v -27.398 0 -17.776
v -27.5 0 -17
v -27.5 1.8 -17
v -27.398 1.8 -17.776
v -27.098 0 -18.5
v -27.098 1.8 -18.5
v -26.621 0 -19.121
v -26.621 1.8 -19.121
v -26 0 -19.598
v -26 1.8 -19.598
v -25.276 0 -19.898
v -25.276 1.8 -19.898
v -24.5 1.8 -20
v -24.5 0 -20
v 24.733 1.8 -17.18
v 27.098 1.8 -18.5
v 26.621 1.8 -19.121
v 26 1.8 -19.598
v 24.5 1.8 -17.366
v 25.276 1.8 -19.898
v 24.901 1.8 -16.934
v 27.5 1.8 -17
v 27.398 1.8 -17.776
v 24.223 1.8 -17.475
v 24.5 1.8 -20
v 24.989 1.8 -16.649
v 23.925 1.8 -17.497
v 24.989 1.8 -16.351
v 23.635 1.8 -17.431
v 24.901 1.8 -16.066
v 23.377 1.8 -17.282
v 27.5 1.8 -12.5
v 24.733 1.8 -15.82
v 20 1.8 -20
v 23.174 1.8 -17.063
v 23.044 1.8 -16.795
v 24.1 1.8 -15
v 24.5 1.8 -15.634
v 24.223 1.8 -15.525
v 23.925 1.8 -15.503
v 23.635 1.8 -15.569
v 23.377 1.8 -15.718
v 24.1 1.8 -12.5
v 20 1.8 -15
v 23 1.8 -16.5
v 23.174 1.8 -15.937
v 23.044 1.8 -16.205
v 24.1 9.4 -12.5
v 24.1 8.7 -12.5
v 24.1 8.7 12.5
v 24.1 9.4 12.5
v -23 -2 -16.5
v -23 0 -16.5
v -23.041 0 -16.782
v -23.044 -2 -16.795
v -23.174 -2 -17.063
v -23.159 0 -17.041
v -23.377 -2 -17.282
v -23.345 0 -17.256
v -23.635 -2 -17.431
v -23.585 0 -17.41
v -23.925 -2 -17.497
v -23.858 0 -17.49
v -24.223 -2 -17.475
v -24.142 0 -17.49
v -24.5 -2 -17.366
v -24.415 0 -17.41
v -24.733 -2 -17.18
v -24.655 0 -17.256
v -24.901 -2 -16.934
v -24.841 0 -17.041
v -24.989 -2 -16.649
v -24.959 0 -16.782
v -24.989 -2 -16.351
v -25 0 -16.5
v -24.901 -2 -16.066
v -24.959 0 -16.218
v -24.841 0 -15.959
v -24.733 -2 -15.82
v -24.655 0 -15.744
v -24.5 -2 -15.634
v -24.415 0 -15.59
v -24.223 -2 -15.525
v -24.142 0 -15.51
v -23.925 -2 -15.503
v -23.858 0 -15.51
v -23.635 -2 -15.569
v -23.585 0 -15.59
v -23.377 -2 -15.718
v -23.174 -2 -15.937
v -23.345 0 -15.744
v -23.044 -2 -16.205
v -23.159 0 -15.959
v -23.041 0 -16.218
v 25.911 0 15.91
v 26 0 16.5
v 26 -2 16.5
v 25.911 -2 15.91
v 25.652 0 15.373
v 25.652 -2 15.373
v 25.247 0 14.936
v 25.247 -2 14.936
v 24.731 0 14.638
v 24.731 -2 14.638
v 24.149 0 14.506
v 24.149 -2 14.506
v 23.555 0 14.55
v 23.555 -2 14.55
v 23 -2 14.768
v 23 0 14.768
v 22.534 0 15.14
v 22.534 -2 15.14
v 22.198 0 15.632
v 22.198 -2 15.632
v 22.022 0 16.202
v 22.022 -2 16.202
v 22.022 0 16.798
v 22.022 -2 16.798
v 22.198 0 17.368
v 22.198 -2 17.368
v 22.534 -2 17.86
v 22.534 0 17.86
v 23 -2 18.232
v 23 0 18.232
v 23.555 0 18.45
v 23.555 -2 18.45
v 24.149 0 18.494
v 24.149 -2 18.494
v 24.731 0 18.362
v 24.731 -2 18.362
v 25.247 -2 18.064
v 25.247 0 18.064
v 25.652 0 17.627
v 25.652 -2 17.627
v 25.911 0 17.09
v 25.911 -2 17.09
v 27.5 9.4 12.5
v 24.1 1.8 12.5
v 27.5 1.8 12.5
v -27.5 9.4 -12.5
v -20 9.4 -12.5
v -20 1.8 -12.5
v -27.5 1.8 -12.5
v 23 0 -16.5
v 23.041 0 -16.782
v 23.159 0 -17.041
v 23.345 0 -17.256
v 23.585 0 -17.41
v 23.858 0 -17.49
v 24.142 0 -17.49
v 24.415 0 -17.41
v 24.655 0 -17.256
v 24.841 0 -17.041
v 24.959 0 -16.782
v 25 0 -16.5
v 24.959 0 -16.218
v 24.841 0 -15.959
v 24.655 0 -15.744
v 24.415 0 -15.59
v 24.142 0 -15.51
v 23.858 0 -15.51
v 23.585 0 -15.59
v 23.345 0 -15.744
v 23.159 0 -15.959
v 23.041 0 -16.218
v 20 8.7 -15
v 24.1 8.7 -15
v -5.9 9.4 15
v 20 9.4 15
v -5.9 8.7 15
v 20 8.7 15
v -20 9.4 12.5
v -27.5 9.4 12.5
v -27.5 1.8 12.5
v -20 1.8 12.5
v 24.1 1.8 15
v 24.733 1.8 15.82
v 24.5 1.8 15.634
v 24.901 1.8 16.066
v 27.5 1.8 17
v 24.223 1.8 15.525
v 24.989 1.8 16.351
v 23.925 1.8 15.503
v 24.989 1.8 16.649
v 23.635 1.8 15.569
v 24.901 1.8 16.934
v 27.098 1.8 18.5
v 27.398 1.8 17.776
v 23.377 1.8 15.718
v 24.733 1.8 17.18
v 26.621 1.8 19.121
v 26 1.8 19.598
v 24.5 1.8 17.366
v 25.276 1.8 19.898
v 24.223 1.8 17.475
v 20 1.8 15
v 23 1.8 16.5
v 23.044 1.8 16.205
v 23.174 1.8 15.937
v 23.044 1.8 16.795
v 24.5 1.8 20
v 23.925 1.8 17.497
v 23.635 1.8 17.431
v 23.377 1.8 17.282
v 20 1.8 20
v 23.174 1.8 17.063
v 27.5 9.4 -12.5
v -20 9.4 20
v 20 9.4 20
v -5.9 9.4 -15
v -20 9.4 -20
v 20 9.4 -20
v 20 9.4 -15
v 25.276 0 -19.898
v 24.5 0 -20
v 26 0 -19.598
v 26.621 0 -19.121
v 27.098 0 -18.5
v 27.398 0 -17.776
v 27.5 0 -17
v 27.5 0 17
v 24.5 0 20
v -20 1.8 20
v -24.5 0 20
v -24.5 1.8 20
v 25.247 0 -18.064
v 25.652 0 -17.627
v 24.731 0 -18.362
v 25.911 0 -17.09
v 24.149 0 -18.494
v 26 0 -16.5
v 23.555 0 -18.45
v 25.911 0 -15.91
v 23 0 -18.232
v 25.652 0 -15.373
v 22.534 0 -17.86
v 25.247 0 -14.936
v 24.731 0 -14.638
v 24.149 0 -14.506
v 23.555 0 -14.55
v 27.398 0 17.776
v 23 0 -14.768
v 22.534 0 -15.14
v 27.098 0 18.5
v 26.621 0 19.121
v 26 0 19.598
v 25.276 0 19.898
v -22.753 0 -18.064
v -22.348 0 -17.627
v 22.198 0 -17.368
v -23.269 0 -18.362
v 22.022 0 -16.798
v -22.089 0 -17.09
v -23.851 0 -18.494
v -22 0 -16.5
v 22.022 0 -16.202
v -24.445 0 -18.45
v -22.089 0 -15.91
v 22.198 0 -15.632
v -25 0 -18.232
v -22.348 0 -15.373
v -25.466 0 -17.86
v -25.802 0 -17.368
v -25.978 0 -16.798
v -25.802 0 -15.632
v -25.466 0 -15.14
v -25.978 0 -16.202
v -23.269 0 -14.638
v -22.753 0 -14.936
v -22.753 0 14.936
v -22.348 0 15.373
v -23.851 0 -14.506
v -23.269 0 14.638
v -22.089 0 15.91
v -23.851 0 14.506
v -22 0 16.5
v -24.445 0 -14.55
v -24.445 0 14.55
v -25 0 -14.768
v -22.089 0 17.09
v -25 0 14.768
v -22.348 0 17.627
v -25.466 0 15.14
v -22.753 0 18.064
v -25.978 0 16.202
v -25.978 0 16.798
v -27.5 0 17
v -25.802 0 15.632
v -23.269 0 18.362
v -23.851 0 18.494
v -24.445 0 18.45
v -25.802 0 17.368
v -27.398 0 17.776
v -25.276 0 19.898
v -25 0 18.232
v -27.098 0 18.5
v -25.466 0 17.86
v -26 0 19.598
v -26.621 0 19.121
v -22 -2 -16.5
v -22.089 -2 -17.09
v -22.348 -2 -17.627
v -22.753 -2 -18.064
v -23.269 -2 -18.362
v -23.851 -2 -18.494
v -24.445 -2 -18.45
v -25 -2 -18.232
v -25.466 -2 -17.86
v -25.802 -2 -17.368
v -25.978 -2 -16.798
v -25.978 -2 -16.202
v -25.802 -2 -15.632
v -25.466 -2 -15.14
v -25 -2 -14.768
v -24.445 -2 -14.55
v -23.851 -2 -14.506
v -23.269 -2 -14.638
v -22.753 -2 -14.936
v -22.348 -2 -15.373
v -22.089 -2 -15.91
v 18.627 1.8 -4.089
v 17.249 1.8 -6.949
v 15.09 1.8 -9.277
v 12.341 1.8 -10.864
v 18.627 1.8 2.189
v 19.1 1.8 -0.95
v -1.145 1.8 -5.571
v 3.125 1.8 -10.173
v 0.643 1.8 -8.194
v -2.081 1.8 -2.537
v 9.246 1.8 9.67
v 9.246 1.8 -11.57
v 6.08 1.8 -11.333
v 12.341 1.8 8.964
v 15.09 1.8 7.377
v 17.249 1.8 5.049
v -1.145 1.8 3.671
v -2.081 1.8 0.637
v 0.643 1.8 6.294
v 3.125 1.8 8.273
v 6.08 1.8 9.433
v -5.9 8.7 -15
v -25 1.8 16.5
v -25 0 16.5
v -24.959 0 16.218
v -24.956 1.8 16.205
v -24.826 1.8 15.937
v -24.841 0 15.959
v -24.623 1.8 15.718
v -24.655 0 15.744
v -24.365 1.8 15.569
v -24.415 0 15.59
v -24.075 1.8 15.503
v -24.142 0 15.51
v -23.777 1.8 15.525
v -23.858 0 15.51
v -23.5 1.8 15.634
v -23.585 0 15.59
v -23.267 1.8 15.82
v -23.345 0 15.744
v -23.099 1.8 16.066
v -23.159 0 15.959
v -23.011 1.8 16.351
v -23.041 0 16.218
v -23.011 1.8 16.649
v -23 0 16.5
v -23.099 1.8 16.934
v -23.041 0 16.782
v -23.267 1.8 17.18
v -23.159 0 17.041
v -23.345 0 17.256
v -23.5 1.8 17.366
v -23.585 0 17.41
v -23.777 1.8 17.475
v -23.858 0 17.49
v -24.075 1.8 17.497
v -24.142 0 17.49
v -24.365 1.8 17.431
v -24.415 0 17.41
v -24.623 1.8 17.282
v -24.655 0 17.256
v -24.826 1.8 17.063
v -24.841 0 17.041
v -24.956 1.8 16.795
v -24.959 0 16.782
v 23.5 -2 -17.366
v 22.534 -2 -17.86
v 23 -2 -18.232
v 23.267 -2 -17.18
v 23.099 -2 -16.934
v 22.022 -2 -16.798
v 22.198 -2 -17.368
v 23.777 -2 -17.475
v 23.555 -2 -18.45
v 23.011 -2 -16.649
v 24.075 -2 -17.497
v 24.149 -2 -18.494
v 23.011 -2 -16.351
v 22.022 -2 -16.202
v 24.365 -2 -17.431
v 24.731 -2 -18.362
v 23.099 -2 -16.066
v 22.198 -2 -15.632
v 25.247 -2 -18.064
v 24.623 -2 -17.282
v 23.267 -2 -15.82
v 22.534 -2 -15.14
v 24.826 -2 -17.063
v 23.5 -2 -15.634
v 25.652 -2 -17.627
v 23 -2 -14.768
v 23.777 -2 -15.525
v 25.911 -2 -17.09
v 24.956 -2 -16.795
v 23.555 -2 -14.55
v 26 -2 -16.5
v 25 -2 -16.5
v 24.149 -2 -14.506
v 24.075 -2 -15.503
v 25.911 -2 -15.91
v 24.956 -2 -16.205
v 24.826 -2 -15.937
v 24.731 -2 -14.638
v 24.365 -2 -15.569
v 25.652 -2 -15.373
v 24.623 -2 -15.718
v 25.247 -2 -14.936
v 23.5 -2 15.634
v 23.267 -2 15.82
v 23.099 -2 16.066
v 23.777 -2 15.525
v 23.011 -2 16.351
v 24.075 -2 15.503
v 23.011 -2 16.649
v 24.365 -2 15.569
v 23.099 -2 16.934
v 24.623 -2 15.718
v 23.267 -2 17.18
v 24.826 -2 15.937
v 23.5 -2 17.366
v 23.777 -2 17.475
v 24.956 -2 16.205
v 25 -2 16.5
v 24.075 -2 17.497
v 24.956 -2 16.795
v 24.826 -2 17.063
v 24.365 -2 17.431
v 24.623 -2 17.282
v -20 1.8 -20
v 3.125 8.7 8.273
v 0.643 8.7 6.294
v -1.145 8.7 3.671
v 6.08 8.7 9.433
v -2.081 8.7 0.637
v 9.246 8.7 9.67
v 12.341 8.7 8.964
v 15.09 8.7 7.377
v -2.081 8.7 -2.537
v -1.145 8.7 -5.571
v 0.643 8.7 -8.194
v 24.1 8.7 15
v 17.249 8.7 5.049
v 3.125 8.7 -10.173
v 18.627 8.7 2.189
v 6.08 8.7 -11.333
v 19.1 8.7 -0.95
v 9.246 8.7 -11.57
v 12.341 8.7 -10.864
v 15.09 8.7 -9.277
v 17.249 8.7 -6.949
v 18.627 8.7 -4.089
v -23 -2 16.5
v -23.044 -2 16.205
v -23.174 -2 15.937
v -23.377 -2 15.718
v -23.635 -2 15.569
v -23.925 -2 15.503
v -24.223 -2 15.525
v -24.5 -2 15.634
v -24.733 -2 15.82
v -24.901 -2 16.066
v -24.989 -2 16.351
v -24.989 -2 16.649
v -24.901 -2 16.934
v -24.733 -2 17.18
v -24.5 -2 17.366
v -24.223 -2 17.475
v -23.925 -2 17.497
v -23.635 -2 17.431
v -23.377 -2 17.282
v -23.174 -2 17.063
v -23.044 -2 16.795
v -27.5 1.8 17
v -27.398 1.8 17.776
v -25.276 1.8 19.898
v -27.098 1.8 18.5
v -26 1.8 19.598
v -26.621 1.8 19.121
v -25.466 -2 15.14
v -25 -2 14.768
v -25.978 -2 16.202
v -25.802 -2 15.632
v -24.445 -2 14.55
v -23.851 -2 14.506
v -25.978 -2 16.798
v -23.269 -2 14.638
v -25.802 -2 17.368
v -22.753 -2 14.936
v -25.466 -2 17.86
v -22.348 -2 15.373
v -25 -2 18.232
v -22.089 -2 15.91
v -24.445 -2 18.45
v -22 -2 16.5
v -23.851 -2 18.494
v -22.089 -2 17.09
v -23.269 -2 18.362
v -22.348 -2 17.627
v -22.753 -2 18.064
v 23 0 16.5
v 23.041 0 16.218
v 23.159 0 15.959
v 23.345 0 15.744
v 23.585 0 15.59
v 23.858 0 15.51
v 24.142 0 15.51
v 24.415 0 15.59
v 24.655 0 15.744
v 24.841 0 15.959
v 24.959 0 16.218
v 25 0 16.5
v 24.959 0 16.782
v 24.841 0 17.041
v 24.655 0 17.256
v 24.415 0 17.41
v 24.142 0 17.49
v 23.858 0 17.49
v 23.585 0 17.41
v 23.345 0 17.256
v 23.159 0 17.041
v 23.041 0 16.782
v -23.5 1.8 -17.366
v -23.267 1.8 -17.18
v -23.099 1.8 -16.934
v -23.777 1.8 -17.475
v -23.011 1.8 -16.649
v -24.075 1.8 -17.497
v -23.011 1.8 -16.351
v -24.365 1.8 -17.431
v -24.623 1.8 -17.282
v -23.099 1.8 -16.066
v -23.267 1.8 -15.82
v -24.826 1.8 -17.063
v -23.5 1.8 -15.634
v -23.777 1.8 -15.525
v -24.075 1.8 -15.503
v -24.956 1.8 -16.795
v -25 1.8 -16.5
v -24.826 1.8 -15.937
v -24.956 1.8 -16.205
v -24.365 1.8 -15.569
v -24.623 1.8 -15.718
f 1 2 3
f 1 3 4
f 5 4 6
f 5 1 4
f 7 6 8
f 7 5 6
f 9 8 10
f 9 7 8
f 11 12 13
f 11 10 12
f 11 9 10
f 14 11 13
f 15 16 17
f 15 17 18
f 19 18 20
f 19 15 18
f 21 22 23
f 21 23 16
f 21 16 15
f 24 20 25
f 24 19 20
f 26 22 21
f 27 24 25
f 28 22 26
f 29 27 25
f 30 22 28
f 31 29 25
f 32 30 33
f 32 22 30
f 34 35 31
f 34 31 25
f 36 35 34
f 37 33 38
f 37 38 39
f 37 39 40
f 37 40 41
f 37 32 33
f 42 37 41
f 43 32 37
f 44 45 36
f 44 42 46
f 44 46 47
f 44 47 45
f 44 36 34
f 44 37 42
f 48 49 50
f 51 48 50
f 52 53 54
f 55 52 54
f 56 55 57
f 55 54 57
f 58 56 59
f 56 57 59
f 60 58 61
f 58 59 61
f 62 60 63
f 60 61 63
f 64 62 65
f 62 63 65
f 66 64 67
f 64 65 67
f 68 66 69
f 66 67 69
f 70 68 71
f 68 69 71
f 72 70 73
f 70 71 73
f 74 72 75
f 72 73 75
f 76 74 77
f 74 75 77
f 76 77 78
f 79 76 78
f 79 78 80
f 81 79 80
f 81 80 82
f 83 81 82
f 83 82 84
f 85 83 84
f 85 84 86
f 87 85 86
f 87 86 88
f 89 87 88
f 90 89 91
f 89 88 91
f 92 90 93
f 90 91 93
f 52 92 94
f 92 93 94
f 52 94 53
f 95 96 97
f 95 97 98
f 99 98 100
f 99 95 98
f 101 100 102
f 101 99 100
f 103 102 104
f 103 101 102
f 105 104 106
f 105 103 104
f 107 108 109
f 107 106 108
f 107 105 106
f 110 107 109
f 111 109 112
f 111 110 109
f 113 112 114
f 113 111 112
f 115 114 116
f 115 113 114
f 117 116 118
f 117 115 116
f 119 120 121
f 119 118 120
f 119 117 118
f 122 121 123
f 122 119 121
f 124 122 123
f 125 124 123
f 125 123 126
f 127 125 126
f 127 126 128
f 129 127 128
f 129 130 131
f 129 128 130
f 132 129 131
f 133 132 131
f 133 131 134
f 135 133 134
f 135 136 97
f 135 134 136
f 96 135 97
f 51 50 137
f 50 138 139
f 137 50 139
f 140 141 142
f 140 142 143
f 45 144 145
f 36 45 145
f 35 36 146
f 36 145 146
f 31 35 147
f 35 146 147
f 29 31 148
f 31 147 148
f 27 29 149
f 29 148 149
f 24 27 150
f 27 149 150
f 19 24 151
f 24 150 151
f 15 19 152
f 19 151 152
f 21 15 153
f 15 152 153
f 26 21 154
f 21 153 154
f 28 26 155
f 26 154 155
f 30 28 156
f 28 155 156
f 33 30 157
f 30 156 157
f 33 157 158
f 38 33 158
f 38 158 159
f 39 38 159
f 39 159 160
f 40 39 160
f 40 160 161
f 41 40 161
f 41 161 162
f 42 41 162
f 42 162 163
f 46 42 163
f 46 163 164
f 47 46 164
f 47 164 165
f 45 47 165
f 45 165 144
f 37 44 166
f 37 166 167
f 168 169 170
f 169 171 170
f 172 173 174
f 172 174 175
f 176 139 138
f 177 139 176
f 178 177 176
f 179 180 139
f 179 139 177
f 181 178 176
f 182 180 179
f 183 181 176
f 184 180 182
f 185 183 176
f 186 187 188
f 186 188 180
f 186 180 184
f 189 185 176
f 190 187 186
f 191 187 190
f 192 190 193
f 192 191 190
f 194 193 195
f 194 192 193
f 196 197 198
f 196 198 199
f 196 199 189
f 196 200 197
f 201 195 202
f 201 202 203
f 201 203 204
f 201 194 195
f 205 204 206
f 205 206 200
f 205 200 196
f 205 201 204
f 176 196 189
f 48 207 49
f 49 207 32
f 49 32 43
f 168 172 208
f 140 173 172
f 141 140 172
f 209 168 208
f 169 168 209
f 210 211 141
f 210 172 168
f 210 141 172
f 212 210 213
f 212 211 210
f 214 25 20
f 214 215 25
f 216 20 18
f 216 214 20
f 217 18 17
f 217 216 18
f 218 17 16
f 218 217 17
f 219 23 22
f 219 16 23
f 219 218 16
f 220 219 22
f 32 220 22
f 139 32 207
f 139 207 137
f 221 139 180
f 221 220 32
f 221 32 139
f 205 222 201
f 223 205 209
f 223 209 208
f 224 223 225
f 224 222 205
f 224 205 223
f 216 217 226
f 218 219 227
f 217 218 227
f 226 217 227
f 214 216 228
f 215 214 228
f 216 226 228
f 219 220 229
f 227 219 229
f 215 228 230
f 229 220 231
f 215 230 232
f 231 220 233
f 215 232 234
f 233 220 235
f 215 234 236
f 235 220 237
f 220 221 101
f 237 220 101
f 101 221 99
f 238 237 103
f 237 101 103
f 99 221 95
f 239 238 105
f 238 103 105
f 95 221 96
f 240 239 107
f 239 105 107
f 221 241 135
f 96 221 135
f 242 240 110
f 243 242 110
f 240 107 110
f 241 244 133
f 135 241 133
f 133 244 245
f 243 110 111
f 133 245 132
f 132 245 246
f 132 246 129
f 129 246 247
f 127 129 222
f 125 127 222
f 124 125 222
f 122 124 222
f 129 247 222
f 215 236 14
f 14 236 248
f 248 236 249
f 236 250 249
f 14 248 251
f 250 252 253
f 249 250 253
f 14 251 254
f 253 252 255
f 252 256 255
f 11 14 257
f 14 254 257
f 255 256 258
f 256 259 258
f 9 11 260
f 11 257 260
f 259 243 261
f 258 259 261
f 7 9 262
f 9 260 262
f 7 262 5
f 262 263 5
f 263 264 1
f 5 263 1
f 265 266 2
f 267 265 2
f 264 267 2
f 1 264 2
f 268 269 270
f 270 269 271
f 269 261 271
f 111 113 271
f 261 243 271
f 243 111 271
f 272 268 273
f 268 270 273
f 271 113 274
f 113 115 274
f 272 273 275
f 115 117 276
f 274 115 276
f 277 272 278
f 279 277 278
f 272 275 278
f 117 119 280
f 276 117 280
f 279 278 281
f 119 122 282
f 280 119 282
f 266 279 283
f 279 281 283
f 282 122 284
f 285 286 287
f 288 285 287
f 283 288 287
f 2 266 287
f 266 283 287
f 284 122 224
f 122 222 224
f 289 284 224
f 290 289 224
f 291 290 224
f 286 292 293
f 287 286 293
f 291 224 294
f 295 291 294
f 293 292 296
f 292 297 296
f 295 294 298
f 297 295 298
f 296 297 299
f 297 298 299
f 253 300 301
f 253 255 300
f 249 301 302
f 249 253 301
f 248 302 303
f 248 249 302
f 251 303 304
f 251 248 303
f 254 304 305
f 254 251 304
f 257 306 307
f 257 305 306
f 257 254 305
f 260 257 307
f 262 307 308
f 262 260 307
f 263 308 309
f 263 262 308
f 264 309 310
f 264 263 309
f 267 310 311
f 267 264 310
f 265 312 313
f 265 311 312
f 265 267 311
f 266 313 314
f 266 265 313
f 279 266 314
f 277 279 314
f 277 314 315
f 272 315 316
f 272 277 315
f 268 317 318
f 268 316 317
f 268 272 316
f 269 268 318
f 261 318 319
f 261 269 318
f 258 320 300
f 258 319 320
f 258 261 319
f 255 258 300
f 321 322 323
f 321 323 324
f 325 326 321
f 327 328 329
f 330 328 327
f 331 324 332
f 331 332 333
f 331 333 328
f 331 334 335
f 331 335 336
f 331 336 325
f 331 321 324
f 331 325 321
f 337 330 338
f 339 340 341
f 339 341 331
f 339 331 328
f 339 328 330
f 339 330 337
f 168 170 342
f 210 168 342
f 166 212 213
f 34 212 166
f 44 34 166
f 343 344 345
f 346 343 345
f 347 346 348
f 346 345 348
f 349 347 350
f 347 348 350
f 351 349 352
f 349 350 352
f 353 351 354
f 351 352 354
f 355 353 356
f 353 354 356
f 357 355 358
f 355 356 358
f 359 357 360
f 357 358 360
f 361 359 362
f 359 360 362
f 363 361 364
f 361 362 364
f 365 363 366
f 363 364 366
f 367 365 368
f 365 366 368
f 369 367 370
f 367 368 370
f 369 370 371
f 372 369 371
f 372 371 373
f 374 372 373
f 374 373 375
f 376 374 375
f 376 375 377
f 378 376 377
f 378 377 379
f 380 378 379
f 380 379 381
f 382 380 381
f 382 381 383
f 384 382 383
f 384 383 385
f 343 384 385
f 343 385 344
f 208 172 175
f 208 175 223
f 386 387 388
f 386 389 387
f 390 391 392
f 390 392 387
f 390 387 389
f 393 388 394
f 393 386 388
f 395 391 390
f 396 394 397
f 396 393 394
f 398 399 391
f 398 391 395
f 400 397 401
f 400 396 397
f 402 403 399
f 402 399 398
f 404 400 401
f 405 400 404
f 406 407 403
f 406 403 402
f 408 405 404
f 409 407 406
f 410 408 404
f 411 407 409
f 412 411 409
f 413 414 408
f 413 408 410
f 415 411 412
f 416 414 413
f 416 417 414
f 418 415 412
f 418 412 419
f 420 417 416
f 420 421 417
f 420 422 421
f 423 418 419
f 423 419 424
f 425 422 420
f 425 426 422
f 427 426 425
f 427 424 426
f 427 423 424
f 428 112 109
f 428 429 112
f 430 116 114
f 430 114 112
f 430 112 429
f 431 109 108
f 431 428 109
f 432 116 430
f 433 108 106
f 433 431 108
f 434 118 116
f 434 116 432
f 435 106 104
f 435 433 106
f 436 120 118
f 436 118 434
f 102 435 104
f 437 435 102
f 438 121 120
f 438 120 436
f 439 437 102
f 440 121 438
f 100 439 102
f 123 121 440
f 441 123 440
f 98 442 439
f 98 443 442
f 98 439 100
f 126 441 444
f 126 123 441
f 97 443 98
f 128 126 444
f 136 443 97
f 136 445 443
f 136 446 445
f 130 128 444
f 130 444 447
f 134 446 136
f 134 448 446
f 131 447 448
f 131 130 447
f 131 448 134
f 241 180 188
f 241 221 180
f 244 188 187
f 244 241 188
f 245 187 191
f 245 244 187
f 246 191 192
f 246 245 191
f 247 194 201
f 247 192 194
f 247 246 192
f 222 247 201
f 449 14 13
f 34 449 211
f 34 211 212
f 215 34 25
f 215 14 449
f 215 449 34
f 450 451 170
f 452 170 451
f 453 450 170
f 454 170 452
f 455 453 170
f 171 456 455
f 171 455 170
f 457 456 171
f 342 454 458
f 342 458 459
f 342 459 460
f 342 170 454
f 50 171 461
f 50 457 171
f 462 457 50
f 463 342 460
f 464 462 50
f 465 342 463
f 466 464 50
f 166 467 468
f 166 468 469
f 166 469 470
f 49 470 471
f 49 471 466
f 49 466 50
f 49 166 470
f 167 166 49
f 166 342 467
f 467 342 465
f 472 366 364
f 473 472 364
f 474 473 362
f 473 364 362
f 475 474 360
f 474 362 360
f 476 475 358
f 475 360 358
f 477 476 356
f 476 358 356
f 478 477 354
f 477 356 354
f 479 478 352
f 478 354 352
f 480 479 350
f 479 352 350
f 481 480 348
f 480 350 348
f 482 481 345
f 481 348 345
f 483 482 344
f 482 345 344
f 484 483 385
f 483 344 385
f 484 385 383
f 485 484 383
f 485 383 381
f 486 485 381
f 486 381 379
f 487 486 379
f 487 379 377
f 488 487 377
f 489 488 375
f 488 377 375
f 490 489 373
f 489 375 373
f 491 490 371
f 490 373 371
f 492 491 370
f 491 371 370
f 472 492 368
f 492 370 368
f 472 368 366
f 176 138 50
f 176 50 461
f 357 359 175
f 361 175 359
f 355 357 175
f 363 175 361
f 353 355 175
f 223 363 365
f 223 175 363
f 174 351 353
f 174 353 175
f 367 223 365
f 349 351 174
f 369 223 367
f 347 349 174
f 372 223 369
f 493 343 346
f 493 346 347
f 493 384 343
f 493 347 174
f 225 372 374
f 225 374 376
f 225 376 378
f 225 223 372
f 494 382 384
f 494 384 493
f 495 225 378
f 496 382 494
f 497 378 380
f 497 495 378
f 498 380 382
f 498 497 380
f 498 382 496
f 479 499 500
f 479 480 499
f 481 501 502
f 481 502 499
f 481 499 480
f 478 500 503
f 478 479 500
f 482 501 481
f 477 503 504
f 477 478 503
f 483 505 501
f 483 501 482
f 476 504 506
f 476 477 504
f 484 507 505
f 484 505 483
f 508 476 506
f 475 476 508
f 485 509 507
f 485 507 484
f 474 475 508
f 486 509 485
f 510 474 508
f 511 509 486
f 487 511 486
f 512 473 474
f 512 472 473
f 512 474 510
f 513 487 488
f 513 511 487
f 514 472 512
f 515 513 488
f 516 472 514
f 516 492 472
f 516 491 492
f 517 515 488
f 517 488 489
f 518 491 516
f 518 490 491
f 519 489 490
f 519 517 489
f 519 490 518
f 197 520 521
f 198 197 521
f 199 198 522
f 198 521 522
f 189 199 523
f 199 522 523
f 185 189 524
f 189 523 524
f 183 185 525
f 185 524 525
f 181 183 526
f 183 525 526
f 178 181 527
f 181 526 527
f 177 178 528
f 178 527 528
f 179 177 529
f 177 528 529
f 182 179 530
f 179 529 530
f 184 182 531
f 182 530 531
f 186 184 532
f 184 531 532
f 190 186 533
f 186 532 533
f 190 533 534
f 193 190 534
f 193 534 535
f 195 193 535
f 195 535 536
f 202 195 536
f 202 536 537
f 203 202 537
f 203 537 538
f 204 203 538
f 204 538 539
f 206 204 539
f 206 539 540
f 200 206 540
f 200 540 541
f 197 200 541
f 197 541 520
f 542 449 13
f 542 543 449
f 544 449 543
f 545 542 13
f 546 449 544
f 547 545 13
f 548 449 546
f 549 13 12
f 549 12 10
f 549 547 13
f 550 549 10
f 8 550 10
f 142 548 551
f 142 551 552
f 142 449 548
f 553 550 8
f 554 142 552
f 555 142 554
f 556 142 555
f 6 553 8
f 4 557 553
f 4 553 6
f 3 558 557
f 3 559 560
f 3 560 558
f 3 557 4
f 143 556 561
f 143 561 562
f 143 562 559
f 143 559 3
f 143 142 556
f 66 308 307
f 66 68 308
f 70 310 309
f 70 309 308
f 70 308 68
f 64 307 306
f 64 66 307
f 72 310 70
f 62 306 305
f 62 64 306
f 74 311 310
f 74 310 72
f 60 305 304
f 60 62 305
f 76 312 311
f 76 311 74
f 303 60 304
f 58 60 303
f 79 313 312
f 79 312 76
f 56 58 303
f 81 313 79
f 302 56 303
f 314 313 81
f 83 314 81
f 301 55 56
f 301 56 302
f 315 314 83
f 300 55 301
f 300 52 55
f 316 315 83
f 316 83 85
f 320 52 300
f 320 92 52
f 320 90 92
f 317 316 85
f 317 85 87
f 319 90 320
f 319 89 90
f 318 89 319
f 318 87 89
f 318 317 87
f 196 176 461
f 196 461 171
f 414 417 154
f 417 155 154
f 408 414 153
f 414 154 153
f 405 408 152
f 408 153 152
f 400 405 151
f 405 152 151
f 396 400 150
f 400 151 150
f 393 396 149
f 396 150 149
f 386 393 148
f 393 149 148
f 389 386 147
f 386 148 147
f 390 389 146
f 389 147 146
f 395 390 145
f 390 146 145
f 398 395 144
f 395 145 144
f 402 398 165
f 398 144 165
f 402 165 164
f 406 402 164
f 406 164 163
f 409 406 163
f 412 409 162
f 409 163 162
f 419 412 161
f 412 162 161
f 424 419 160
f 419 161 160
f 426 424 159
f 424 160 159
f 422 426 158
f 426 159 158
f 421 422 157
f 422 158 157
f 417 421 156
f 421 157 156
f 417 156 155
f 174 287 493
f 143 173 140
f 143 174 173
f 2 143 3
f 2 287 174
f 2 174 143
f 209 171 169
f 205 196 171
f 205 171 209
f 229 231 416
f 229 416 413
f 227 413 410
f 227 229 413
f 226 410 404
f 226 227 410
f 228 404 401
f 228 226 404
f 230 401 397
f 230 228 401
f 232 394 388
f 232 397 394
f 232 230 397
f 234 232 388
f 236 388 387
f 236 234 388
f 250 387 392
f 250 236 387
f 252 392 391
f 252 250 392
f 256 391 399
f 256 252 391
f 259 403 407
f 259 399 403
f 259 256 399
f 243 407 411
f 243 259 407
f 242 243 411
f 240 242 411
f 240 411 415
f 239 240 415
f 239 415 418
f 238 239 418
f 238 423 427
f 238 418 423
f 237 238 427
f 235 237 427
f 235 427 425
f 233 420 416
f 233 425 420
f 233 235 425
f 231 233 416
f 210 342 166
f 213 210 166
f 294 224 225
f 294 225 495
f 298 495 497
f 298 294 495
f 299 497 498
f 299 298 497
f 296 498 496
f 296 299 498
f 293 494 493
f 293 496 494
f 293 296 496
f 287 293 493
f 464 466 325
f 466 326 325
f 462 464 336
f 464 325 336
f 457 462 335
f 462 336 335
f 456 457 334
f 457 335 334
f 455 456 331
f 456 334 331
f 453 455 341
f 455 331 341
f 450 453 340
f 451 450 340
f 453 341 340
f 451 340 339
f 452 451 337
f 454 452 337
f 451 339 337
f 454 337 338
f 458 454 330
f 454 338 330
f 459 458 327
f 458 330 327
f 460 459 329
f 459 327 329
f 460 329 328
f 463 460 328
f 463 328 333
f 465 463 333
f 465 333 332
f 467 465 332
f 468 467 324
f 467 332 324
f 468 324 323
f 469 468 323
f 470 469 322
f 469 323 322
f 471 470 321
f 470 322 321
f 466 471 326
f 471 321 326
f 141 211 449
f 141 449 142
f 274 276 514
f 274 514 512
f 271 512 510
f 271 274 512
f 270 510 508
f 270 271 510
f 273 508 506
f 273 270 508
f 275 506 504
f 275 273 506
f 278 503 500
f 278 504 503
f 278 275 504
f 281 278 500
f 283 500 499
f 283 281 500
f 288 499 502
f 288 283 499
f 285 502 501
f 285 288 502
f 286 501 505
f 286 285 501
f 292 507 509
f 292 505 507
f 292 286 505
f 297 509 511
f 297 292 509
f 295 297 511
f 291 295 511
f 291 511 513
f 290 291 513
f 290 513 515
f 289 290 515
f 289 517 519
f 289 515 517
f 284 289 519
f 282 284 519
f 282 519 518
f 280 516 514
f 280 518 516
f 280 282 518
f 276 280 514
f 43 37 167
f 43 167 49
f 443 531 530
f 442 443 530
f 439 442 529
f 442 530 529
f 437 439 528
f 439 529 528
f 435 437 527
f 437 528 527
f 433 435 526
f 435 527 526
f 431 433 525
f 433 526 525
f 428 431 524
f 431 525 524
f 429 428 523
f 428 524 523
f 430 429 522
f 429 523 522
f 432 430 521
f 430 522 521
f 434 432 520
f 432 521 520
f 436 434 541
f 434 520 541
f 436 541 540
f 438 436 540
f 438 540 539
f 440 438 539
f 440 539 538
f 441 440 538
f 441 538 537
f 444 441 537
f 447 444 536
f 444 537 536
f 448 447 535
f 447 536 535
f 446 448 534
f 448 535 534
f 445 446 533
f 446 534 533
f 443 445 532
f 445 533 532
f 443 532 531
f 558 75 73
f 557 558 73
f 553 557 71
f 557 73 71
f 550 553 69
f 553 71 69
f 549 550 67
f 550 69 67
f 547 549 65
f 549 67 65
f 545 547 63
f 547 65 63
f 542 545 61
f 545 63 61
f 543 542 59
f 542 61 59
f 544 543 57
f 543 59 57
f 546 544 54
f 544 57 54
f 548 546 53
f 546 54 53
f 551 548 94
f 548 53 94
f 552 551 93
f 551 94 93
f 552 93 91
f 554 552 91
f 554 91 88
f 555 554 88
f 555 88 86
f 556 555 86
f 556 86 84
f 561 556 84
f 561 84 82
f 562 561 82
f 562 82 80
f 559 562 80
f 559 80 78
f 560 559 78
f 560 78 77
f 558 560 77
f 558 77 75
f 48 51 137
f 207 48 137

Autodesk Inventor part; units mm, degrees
ref_plane "YZ Plane" through (0, 0, 0) normal (1, 0, 0) x (0, 1, 0)
ref_plane "XZ Plane" through (0, 0, 0) normal (0, 1, 0) x (-1, 0, 0)
ref_plane "XY Plane" through (0, 0, 0) normal (0, 0, 1) x (1, 0, 0)
sketch "Эскиз1" plane through (0, 0, 0) normal (0, 1, 0) x (-1, 0, 0)
  line L0 (-24.5, 20) -> (24.5, 20)
  line L1 (27.5, 17) -> (27.5, -17)
  line L2 (24.5, -20) -> (-24.5, -20)
  line L3 (-27.5, -17) -> (-27.5, 17)
  line L4 (-27.5, 20) -> (27.5, -20) construction
  line L5 (27.5, 20) -> (-27.5, -20) construction
  arc A0 (24.5, -20) -> (27.5, -17) centre (24.5, -17) ccw
  arc A1 (-27.5, -17) -> (-24.5, -20) centre (-24.5, -17) ccw
  arc A2 (-24.5, 20) -> (-27.5, 17) centre (-24.5, 17) ccw
  arc A3 (27.5, 17) -> (24.5, 20) centre (24.5, 17) ccw
  line L6 (-24, 16.5) -> (24, 16.5)
  line L7 (24, 16.5) -> (24, -16.5)
  line L8 (24, -16.5) -> (-24, -16.5)
  line L9 (-24, -16.5) -> (-24, 16.5)
  line L10 (-24, 16.5) -> (24, -16.5) construction
  line L11 (24, 16.5) -> (-24, -16.5) construction
  circle A4 centre (24, 16.5) radius 1
  circle A5 centre (24, -16.5) radius 1
  circle A6 centre (-24, -16.5) radius 1
  circle A7 centre (-24, 16.5) radius 1
  point P0 (0, 0)
  dimension "d0" = 55
  dimension "d1" = 40
  dimension "d2" = 3
  dimension "d3" = 3
  dimension "d30" = 48
  dimension "d31" = 33
  dimension "d32" = 2
  dimension "d33" = 2
  dimension "d34" = 2
  dimension "d35" = 2
extrude "Выдавливание1" add sketch "Эскиз1" along normal blind 1.8 contours L0 A3 L1 A0 L2 A1 L3 A2 | L6 A4 L7 A5 L8 A6 L9 A7
sketch "Эскиз2" plane through (0, 1.8, 0) normal (0, 1, 0) x (1, 0, 0)
  line L0 (-5.9, 15) -> (24.1, 15)
  line L1 (24.1, 15) -> (24.1, -15)
  line L2 (24.1, -15) -> (-5.9, -15)
  line L3 (-5.9, -15) -> (-5.9, 15)
  line L4 (-5.9, 15) -> (24.1, -15) construction
  line L5 (24.1, 15) -> (-5.9, -15) construction
  line L6 (27.5, -17) -> (27.5, 17) projected
  line L7 (-27.5, 17) -> (-27.5, -17) projected
  line L8 (-27.5, 0) -> (27.5, 0)
  circle A0 centre (8.45, 0.95) radius 10.65
  line L9 (8.45, 15) -> (8.45, 0.95)
  line L10 (8.45, 11.6) -> (8.45, 15)
  line L11 (-5.9, 0.95) -> (8.45, 0.95)
  line L12 (-5.9, 0.95) -> (-2.2, 0.95)
  point P0 (0, 0)
  point P1 (9.1, 0)
  dimension "d10" = 30
  dimension "d11" = 30
  dimension "d12" = 3.4
  dimension "d13" = 21.3
  dimension "d14" = 3.4
  dimension "d15" = 3.7
extrude "Выдавливание2" add sketch "Эскиз2" along normal blind 6.9 contours L0 L9 A0 L11 L3 | L0 L1 L8 A0 L9 | L11 A0 L8 L3 | L8 A0 L1 L2 L3
sketch "Эскиз3" plane through (0, 1.8, 0) normal (0, 1, 0) x (1, 0, 0)
  line L0 (24.5, 20) -> (-24.5, 20) projected
  arc A0 (-24.5, 20) -> (-27.5, 17) centre (-24.5, 17) ccw projected
  line L1 (-27.5, 17) -> (-27.5, -17) projected
  arc A1 (-27.5, -17) -> (-24.5, -20) centre (-24.5, -17) ccw projected
  line L2 (-24.5, -20) -> (24.5, -20) projected
  arc A2 (24.5, -20) -> (27.5, -17) centre (24.5, -17) ccw projected
  line L3 (27.5, -17) -> (27.5, 17) projected
  arc A3 (27.5, 17) -> (24.5, 20) centre (24.5, 17) ccw projected
  line L4 (-5.9, 15) -> (24.1, 15) projected
  line L5 (24.1, 15) -> (24.1, -15) projected
  line L6 (24.1, -15) -> (-5.9, -15) projected
  line L7 (-5.9, -15) -> (-5.9, 15) projected
  line L8 (24.5, 20) -> (-24.5, 20) projected
  line L9 (-20, 20) -> (-20, -20)
  line L10 (-27.5, 17) -> (-27.5, -17) projected
  line L11 (-27.5, -12.5) -> (27.5, -12.5)
  line L12 (27.5, -17) -> (27.5, 17) projected
  line L13 (20, 20) -> (20, -20)
  line L14 (-24.5, -20) -> (24.5, -20) projected
  line L15 (27.5, 12.5) -> (-27.5, 12.5)
  point P0 (0, 0)
  point P1 (24.1, 12.5)
  point P2 (24.1, -12.5)
  point P3 (-20, 12.5)
  point P4 (-20, -12.5)
  point P5 (20, -15)
  point P6 (20, 15)
  dimension "d18" = 7.5
  dimension "d19" = 7.5
  dimension "d20" = 7.5
  dimension "d21" = 7.5
extrude "Выдавливание3" add sketch "Эскиз3" along normal blind 7.6 contours L13 L4 L7 L15 L9 L0 | L3 L11 L5 L15 | L15 L7 L11 L9 | L9 L11 L1 L15 | L11 L7 L6 L13 L2 L9
sketch "Эскиз4" plane through (0, 0, 0) normal (0, -1, 0) x (1, 0, 0)
  circle A0 centre (-24, 16.5) radius 1 projected
  circle A1 centre (-24, 16.5) radius 2
  circle A2 centre (-24, -16.5) radius 1 projected
  circle A3 centre (-24, -16.5) radius 2
  circle A4 centre (24, -16.5) radius 1 projected
  circle A5 centre (24, -16.5) radius 2
  circle A6 centre (24, 16.5) radius 1 projected
  circle A7 centre (24, 16.5) radius 2
  point P0 (-24.5, 17)
  point P1 (24.5, 17)
  point P2 (24.5, -17)
  point P3 (-24.5, -17)
  dimension "d36" = 4
  dimension "d37" = 4
  dimension "d38" = 4
  dimension "d39" = 4
extrude "Выдавливание4" add sketch "Эскиз4" along normal blind 2
equation "\"d19\" = d18"
equation "\"d20\" = d18"
equation "\"d21\" = d18"
properties part number "PRI_cooler"
